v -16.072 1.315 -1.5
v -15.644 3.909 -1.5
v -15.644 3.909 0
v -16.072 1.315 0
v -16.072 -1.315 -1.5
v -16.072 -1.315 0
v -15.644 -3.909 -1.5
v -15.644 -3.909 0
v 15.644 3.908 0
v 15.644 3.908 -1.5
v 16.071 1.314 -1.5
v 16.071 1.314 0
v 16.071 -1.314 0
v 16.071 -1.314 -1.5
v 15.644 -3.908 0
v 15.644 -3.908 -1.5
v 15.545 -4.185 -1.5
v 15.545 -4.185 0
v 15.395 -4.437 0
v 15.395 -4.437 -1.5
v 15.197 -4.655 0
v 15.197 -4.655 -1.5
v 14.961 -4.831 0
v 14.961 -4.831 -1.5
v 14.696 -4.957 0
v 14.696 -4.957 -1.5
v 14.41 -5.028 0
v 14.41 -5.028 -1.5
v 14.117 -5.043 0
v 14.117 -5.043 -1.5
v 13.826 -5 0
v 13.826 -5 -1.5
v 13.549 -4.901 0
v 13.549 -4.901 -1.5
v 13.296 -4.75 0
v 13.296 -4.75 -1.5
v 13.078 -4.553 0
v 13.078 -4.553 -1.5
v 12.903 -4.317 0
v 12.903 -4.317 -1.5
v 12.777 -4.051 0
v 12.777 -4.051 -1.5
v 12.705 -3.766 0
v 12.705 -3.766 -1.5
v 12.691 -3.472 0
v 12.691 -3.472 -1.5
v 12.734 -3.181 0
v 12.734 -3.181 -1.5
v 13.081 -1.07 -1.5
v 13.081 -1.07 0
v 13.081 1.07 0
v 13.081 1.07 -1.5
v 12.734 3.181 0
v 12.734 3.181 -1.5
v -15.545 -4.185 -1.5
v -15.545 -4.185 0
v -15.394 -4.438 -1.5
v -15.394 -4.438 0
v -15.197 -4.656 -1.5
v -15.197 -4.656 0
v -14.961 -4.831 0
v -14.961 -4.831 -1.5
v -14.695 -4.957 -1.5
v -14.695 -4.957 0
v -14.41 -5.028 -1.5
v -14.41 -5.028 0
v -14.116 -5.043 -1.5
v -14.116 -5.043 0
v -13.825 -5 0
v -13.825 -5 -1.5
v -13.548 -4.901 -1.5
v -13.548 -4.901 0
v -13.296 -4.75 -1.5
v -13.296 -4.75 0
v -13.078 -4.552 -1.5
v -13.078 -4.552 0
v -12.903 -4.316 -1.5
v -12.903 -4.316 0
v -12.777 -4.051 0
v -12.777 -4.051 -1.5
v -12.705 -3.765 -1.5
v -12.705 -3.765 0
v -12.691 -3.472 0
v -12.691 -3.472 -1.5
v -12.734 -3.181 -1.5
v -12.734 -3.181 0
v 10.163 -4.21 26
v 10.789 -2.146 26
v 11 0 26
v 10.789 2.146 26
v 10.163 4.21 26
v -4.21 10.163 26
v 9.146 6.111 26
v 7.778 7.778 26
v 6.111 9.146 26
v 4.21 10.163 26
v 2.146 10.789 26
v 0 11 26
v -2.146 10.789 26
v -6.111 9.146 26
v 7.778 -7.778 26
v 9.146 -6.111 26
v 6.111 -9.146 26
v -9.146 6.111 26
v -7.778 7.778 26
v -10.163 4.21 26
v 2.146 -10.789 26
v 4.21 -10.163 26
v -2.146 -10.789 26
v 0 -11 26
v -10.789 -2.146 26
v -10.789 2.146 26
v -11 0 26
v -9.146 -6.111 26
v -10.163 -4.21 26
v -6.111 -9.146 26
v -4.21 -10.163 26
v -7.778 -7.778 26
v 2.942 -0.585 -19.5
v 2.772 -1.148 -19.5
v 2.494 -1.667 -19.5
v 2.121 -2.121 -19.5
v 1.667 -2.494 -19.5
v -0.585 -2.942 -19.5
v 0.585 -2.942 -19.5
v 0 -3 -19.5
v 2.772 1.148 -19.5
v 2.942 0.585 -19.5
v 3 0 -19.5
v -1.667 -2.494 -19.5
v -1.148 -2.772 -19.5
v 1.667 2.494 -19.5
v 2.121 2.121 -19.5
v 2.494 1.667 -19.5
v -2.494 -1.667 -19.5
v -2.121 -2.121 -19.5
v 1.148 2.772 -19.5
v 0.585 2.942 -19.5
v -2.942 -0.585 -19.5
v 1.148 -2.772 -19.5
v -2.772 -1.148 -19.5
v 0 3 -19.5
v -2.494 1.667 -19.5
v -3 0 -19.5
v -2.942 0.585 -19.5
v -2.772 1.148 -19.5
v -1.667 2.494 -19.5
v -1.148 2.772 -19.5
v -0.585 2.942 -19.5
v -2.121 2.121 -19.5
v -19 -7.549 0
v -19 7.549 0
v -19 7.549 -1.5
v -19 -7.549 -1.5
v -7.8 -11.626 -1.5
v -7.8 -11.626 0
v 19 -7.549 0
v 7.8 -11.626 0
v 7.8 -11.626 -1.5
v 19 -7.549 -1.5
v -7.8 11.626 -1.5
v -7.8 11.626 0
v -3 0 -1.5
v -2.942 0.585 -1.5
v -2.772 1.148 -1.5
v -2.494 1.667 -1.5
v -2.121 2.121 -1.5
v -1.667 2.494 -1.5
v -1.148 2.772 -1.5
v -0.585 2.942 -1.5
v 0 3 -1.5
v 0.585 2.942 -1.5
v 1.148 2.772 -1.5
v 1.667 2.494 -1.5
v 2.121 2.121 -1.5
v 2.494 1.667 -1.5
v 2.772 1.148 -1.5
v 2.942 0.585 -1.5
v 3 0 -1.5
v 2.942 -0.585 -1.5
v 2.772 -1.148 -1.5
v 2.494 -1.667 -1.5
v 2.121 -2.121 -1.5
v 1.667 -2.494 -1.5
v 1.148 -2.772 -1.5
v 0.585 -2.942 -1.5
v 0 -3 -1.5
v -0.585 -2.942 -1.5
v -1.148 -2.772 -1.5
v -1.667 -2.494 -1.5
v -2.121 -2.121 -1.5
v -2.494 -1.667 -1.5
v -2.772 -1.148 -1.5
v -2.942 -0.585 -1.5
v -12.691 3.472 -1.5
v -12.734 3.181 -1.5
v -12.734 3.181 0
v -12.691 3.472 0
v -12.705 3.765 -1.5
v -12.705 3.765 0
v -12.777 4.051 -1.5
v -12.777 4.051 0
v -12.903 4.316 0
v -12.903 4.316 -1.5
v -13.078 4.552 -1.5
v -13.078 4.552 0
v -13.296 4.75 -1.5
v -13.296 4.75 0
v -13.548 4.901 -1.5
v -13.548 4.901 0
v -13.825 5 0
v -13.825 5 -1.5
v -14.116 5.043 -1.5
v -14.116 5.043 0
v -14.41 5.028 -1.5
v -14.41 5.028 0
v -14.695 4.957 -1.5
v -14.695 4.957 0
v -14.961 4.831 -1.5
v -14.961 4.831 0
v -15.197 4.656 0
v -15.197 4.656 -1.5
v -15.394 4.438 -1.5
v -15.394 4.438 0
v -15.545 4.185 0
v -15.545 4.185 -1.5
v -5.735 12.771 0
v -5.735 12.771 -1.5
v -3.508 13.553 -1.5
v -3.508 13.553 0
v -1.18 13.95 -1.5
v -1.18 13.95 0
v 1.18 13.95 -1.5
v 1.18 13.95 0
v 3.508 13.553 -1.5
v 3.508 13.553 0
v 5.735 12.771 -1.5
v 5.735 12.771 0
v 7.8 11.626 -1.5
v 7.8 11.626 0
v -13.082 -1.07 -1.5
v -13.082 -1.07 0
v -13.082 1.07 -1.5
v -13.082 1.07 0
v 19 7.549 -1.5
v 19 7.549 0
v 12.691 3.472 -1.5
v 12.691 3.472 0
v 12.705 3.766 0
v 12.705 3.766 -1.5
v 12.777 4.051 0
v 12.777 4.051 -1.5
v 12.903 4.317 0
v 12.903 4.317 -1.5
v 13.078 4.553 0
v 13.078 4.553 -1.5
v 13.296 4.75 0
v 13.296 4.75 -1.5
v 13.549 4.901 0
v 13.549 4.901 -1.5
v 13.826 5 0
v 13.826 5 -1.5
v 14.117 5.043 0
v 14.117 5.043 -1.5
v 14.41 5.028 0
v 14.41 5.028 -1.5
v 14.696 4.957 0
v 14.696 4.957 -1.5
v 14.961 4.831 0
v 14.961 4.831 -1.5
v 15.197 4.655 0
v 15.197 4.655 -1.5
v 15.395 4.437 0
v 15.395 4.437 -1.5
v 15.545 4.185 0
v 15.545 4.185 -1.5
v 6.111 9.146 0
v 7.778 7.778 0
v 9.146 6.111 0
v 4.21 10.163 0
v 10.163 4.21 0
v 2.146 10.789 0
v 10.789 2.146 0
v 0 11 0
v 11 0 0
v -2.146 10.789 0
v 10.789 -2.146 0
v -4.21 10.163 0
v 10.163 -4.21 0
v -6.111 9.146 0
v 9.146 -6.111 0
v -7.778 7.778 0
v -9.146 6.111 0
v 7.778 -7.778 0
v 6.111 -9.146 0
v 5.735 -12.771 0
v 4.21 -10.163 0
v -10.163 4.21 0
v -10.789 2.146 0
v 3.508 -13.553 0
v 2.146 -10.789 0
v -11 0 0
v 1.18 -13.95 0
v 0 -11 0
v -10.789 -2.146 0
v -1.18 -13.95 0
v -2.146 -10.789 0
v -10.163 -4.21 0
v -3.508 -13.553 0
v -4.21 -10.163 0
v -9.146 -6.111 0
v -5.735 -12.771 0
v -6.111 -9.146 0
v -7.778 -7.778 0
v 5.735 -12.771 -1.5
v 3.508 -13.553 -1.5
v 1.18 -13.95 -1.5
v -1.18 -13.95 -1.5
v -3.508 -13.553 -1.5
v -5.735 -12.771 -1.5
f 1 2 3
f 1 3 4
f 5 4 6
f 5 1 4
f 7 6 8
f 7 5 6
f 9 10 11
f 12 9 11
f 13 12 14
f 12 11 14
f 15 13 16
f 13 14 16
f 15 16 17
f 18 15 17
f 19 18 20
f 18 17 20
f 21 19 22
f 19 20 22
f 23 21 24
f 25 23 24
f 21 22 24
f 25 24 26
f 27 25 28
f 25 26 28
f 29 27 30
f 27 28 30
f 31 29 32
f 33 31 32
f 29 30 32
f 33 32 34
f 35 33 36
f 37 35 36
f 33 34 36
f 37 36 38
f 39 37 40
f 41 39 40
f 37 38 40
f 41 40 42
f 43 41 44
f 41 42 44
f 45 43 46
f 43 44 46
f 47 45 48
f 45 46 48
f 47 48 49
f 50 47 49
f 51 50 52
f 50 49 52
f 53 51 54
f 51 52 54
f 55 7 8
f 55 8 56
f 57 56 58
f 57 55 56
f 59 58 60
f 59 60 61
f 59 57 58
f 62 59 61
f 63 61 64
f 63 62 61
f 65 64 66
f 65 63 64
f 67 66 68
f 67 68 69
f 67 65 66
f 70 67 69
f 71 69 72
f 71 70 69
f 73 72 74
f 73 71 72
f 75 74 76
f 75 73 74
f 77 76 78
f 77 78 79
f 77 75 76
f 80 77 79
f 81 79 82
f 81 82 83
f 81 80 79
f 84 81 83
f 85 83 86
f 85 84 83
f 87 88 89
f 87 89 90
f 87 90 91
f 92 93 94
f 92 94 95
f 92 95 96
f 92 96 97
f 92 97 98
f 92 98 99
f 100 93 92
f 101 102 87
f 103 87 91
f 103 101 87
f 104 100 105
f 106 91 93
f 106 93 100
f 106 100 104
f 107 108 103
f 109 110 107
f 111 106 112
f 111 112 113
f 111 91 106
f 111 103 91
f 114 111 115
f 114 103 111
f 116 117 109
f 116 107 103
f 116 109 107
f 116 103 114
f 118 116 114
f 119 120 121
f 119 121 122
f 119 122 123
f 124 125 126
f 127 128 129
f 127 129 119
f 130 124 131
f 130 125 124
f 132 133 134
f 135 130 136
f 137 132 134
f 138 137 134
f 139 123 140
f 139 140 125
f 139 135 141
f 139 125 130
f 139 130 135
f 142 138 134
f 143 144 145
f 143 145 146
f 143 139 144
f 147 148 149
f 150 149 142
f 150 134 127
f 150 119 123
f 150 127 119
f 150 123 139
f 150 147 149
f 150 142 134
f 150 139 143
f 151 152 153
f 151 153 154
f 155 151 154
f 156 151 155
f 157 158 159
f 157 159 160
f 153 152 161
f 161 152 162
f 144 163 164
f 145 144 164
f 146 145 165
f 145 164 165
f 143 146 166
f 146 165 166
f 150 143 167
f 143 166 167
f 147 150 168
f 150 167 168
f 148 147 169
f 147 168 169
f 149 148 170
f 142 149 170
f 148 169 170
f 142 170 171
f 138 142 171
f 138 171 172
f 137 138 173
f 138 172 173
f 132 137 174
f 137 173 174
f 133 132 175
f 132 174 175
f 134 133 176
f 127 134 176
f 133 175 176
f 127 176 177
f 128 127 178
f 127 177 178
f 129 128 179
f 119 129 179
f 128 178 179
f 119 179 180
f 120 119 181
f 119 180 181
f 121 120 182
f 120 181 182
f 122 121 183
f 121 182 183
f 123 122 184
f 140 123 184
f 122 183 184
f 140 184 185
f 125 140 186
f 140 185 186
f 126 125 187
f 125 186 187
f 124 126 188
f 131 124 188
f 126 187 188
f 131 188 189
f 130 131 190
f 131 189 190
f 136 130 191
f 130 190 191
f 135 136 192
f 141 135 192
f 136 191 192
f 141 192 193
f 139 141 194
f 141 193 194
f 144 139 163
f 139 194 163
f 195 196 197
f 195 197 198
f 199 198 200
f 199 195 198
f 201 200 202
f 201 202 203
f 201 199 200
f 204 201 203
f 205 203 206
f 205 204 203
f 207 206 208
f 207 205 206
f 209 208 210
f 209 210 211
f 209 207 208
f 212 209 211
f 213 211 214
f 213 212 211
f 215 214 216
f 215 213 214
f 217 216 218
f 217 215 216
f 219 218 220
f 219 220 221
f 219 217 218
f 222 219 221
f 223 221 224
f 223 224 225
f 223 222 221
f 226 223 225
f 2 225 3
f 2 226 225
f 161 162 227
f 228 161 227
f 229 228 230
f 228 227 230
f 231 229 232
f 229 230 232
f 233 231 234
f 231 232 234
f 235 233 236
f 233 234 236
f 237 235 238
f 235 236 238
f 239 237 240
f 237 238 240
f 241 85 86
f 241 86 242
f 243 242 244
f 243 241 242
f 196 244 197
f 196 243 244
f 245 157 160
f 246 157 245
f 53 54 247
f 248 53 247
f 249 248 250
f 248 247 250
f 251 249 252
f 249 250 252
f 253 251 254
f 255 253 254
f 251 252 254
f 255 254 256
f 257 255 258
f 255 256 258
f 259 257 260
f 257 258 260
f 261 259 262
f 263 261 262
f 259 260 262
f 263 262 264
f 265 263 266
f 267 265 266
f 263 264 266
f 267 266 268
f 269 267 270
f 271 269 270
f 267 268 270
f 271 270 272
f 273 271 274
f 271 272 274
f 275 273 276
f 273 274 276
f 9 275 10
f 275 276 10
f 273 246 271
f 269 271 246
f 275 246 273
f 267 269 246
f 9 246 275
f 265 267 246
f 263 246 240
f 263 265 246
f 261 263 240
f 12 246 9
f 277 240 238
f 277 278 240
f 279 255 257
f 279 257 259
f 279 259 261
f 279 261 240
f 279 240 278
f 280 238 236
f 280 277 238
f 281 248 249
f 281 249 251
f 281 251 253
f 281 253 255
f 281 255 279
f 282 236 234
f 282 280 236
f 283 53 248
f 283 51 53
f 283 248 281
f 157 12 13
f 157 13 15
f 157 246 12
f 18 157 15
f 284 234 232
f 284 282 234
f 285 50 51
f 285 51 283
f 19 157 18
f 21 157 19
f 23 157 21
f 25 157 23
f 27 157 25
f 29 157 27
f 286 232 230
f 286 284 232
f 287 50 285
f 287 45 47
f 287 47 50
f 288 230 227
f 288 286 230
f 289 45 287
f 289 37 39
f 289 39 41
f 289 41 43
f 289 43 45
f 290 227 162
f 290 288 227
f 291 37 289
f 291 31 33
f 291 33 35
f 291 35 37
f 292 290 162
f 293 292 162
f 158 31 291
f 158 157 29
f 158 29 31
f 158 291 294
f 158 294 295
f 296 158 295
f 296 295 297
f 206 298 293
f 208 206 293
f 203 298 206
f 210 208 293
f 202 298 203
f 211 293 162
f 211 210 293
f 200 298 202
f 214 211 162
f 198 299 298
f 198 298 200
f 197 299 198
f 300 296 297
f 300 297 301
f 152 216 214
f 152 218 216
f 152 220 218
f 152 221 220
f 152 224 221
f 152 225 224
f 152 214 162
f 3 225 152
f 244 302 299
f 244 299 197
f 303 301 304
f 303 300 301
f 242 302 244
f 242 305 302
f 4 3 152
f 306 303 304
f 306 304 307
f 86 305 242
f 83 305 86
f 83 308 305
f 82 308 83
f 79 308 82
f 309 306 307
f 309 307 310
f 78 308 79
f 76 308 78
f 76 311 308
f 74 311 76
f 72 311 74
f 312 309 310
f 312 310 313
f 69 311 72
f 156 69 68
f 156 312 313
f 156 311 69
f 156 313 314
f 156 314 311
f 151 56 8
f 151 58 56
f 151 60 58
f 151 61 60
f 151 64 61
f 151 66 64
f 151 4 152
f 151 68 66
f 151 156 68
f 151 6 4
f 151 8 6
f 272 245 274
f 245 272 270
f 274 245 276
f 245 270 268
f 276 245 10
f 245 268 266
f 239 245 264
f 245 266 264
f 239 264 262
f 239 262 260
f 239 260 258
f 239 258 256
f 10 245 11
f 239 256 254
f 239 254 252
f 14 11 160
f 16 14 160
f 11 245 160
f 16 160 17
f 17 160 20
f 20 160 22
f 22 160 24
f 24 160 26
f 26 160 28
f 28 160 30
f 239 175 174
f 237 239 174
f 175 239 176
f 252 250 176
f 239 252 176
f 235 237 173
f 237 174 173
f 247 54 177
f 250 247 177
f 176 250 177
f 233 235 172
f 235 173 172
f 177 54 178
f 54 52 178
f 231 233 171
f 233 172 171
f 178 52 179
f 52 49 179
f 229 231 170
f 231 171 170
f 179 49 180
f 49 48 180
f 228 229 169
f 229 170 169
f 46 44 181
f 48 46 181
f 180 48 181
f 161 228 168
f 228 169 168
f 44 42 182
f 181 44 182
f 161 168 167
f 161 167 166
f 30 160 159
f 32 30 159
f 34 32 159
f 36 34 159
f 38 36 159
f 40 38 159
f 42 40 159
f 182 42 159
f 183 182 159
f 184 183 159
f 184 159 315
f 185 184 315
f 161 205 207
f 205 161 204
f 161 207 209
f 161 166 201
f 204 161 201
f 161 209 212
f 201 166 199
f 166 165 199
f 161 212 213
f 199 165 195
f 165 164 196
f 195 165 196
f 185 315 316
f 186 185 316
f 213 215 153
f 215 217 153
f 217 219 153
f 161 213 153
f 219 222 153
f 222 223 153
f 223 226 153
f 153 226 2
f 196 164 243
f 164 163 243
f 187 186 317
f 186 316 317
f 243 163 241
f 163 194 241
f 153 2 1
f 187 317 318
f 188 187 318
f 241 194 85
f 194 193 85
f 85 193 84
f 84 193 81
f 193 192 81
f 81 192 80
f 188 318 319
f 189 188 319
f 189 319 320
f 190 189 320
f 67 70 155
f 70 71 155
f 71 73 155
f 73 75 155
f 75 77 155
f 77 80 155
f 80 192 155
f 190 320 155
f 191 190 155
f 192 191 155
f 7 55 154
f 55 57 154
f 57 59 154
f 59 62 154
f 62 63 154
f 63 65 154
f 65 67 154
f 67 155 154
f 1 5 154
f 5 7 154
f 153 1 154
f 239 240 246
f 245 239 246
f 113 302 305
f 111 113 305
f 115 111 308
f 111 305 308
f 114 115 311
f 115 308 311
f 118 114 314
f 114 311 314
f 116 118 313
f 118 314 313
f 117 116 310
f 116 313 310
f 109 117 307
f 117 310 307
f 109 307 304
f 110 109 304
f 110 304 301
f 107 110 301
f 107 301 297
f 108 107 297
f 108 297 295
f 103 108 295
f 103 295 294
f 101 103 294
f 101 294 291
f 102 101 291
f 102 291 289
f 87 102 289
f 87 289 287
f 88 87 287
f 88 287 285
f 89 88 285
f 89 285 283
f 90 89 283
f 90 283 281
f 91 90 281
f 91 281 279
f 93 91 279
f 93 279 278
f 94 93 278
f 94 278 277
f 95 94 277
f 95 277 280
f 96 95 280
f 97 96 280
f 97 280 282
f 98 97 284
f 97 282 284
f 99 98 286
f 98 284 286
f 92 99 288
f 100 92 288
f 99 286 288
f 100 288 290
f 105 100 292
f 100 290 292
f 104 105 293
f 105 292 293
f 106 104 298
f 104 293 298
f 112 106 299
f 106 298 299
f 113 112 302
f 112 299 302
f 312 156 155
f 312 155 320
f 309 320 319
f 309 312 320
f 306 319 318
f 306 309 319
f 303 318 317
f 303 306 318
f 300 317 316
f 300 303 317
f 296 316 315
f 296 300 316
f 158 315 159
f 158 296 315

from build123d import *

# Parameters (mm, degrees)
ESQUISSE1_R             = 11
BOSS_EXTRU_1_DEPTH      = 26
BOSS_EXTRU_2_DEPTH      = 1.5
ENL_V_MAT_EXTRU_1_DEPTH = 1.5
ESQUISSE4_R             = 3
BOSS_EXTRU_3_DEPTH      = 18


with BuildPart() as part:
    # Esquisse1 → Boss.-Extru.1 (new body)
    with BuildSketch(Plane.XY):
        with Locations(Location((0, 0, 0), (0, 0, 180))):
            Circle(ESQUISSE1_R)
    extrude(amount=BOSS_EXTRU_1_DEPTH)

    # Esquisse2 → Boss.-Extru.2 (add)
    with BuildSketch(Plane(origin=(0, 0, 0), x_dir=(-1, 0, 0), z_dir=(0, 0, -1))):
        with BuildLine():
            Line((-7.8, 11.625833303), (-19, 7.54936668))
            Line((-19, 7.54936668), (-19, 0))
            Line((-19, 0), (19, 0))
            Line((19, 0), (19, 7.54936668))
            Line((19, 7.54936668), (7.8, 11.625833303))
            ThreePointArc((7.8, 11.625833303), (0, 14), (-7.8, 11.625833303))
        make_face()
    boss_extru_2 = extrude(amount=BOSS_EXTRU_2_DEPTH)

    # Symétrie1: Boss.-Extru.2 across plane
    add(boss_extru_2.mirror(Plane(origin=(19, 0, -1.5), x_dir=(0, 0, 1), z_dir=(0, 1, 0))))

    # Esquisse3 → Enlèv. mat.-Extru.1 (cut)
    with BuildSketch(Plane(origin=(0, 0, -1.5), x_dir=(-1, 0, 0), z_dir=(0, 0, -1))):
        with BuildLine():
            ThreePointArc((-15.644312892, 3.907824988), (-16.124554191, 0), (-15.644312892, -3.907824988))
            ThreePointArc((-15.644312892, -3.907824988), (-13.825754742, -5), (-12.73357973, -3.181441851))
            ThreePointArc((-12.73357973, -3.181441851), (-13.124554191, 0), (-12.73357973, 3.181441851))
            ThreePointArc((-12.73357973, 3.181441851), (-13.825754742, 5), (-15.644312892, 3.907824988))
        make_face()
        with BuildLine():
            ThreePointArc((15.644132561, 3.908546838), (16.125446605, 0), (15.644132561, -3.908546838))
            ThreePointArc((15.644132561, -3.908546838), (13.825032892, -4.99981967), (12.733760061, -3.18072))
            ThreePointArc((12.733760061, -3.18072), (13.125446605, 0), (12.733760061, 3.18072))
            ThreePointArc((12.733760061, 3.18072), (13.825032892, 4.99981967), (15.644132561, 3.908546838))
        make_face()
    extrude(amount=-ENL_V_MAT_EXTRU_1_DEPTH, mode=Mode.SUBTRACT)

    # Esquisse4 → Boss.-Extru.3 (add)
    with BuildSketch(Plane(origin=(0, 0, -1.5), x_dir=(-1, 0, 0), z_dir=(0, 0, -1))):
        Circle(ESQUISSE4_R)
    extrude(amount=BOSS_EXTRU_3_DEPTH)


solid = part.part
